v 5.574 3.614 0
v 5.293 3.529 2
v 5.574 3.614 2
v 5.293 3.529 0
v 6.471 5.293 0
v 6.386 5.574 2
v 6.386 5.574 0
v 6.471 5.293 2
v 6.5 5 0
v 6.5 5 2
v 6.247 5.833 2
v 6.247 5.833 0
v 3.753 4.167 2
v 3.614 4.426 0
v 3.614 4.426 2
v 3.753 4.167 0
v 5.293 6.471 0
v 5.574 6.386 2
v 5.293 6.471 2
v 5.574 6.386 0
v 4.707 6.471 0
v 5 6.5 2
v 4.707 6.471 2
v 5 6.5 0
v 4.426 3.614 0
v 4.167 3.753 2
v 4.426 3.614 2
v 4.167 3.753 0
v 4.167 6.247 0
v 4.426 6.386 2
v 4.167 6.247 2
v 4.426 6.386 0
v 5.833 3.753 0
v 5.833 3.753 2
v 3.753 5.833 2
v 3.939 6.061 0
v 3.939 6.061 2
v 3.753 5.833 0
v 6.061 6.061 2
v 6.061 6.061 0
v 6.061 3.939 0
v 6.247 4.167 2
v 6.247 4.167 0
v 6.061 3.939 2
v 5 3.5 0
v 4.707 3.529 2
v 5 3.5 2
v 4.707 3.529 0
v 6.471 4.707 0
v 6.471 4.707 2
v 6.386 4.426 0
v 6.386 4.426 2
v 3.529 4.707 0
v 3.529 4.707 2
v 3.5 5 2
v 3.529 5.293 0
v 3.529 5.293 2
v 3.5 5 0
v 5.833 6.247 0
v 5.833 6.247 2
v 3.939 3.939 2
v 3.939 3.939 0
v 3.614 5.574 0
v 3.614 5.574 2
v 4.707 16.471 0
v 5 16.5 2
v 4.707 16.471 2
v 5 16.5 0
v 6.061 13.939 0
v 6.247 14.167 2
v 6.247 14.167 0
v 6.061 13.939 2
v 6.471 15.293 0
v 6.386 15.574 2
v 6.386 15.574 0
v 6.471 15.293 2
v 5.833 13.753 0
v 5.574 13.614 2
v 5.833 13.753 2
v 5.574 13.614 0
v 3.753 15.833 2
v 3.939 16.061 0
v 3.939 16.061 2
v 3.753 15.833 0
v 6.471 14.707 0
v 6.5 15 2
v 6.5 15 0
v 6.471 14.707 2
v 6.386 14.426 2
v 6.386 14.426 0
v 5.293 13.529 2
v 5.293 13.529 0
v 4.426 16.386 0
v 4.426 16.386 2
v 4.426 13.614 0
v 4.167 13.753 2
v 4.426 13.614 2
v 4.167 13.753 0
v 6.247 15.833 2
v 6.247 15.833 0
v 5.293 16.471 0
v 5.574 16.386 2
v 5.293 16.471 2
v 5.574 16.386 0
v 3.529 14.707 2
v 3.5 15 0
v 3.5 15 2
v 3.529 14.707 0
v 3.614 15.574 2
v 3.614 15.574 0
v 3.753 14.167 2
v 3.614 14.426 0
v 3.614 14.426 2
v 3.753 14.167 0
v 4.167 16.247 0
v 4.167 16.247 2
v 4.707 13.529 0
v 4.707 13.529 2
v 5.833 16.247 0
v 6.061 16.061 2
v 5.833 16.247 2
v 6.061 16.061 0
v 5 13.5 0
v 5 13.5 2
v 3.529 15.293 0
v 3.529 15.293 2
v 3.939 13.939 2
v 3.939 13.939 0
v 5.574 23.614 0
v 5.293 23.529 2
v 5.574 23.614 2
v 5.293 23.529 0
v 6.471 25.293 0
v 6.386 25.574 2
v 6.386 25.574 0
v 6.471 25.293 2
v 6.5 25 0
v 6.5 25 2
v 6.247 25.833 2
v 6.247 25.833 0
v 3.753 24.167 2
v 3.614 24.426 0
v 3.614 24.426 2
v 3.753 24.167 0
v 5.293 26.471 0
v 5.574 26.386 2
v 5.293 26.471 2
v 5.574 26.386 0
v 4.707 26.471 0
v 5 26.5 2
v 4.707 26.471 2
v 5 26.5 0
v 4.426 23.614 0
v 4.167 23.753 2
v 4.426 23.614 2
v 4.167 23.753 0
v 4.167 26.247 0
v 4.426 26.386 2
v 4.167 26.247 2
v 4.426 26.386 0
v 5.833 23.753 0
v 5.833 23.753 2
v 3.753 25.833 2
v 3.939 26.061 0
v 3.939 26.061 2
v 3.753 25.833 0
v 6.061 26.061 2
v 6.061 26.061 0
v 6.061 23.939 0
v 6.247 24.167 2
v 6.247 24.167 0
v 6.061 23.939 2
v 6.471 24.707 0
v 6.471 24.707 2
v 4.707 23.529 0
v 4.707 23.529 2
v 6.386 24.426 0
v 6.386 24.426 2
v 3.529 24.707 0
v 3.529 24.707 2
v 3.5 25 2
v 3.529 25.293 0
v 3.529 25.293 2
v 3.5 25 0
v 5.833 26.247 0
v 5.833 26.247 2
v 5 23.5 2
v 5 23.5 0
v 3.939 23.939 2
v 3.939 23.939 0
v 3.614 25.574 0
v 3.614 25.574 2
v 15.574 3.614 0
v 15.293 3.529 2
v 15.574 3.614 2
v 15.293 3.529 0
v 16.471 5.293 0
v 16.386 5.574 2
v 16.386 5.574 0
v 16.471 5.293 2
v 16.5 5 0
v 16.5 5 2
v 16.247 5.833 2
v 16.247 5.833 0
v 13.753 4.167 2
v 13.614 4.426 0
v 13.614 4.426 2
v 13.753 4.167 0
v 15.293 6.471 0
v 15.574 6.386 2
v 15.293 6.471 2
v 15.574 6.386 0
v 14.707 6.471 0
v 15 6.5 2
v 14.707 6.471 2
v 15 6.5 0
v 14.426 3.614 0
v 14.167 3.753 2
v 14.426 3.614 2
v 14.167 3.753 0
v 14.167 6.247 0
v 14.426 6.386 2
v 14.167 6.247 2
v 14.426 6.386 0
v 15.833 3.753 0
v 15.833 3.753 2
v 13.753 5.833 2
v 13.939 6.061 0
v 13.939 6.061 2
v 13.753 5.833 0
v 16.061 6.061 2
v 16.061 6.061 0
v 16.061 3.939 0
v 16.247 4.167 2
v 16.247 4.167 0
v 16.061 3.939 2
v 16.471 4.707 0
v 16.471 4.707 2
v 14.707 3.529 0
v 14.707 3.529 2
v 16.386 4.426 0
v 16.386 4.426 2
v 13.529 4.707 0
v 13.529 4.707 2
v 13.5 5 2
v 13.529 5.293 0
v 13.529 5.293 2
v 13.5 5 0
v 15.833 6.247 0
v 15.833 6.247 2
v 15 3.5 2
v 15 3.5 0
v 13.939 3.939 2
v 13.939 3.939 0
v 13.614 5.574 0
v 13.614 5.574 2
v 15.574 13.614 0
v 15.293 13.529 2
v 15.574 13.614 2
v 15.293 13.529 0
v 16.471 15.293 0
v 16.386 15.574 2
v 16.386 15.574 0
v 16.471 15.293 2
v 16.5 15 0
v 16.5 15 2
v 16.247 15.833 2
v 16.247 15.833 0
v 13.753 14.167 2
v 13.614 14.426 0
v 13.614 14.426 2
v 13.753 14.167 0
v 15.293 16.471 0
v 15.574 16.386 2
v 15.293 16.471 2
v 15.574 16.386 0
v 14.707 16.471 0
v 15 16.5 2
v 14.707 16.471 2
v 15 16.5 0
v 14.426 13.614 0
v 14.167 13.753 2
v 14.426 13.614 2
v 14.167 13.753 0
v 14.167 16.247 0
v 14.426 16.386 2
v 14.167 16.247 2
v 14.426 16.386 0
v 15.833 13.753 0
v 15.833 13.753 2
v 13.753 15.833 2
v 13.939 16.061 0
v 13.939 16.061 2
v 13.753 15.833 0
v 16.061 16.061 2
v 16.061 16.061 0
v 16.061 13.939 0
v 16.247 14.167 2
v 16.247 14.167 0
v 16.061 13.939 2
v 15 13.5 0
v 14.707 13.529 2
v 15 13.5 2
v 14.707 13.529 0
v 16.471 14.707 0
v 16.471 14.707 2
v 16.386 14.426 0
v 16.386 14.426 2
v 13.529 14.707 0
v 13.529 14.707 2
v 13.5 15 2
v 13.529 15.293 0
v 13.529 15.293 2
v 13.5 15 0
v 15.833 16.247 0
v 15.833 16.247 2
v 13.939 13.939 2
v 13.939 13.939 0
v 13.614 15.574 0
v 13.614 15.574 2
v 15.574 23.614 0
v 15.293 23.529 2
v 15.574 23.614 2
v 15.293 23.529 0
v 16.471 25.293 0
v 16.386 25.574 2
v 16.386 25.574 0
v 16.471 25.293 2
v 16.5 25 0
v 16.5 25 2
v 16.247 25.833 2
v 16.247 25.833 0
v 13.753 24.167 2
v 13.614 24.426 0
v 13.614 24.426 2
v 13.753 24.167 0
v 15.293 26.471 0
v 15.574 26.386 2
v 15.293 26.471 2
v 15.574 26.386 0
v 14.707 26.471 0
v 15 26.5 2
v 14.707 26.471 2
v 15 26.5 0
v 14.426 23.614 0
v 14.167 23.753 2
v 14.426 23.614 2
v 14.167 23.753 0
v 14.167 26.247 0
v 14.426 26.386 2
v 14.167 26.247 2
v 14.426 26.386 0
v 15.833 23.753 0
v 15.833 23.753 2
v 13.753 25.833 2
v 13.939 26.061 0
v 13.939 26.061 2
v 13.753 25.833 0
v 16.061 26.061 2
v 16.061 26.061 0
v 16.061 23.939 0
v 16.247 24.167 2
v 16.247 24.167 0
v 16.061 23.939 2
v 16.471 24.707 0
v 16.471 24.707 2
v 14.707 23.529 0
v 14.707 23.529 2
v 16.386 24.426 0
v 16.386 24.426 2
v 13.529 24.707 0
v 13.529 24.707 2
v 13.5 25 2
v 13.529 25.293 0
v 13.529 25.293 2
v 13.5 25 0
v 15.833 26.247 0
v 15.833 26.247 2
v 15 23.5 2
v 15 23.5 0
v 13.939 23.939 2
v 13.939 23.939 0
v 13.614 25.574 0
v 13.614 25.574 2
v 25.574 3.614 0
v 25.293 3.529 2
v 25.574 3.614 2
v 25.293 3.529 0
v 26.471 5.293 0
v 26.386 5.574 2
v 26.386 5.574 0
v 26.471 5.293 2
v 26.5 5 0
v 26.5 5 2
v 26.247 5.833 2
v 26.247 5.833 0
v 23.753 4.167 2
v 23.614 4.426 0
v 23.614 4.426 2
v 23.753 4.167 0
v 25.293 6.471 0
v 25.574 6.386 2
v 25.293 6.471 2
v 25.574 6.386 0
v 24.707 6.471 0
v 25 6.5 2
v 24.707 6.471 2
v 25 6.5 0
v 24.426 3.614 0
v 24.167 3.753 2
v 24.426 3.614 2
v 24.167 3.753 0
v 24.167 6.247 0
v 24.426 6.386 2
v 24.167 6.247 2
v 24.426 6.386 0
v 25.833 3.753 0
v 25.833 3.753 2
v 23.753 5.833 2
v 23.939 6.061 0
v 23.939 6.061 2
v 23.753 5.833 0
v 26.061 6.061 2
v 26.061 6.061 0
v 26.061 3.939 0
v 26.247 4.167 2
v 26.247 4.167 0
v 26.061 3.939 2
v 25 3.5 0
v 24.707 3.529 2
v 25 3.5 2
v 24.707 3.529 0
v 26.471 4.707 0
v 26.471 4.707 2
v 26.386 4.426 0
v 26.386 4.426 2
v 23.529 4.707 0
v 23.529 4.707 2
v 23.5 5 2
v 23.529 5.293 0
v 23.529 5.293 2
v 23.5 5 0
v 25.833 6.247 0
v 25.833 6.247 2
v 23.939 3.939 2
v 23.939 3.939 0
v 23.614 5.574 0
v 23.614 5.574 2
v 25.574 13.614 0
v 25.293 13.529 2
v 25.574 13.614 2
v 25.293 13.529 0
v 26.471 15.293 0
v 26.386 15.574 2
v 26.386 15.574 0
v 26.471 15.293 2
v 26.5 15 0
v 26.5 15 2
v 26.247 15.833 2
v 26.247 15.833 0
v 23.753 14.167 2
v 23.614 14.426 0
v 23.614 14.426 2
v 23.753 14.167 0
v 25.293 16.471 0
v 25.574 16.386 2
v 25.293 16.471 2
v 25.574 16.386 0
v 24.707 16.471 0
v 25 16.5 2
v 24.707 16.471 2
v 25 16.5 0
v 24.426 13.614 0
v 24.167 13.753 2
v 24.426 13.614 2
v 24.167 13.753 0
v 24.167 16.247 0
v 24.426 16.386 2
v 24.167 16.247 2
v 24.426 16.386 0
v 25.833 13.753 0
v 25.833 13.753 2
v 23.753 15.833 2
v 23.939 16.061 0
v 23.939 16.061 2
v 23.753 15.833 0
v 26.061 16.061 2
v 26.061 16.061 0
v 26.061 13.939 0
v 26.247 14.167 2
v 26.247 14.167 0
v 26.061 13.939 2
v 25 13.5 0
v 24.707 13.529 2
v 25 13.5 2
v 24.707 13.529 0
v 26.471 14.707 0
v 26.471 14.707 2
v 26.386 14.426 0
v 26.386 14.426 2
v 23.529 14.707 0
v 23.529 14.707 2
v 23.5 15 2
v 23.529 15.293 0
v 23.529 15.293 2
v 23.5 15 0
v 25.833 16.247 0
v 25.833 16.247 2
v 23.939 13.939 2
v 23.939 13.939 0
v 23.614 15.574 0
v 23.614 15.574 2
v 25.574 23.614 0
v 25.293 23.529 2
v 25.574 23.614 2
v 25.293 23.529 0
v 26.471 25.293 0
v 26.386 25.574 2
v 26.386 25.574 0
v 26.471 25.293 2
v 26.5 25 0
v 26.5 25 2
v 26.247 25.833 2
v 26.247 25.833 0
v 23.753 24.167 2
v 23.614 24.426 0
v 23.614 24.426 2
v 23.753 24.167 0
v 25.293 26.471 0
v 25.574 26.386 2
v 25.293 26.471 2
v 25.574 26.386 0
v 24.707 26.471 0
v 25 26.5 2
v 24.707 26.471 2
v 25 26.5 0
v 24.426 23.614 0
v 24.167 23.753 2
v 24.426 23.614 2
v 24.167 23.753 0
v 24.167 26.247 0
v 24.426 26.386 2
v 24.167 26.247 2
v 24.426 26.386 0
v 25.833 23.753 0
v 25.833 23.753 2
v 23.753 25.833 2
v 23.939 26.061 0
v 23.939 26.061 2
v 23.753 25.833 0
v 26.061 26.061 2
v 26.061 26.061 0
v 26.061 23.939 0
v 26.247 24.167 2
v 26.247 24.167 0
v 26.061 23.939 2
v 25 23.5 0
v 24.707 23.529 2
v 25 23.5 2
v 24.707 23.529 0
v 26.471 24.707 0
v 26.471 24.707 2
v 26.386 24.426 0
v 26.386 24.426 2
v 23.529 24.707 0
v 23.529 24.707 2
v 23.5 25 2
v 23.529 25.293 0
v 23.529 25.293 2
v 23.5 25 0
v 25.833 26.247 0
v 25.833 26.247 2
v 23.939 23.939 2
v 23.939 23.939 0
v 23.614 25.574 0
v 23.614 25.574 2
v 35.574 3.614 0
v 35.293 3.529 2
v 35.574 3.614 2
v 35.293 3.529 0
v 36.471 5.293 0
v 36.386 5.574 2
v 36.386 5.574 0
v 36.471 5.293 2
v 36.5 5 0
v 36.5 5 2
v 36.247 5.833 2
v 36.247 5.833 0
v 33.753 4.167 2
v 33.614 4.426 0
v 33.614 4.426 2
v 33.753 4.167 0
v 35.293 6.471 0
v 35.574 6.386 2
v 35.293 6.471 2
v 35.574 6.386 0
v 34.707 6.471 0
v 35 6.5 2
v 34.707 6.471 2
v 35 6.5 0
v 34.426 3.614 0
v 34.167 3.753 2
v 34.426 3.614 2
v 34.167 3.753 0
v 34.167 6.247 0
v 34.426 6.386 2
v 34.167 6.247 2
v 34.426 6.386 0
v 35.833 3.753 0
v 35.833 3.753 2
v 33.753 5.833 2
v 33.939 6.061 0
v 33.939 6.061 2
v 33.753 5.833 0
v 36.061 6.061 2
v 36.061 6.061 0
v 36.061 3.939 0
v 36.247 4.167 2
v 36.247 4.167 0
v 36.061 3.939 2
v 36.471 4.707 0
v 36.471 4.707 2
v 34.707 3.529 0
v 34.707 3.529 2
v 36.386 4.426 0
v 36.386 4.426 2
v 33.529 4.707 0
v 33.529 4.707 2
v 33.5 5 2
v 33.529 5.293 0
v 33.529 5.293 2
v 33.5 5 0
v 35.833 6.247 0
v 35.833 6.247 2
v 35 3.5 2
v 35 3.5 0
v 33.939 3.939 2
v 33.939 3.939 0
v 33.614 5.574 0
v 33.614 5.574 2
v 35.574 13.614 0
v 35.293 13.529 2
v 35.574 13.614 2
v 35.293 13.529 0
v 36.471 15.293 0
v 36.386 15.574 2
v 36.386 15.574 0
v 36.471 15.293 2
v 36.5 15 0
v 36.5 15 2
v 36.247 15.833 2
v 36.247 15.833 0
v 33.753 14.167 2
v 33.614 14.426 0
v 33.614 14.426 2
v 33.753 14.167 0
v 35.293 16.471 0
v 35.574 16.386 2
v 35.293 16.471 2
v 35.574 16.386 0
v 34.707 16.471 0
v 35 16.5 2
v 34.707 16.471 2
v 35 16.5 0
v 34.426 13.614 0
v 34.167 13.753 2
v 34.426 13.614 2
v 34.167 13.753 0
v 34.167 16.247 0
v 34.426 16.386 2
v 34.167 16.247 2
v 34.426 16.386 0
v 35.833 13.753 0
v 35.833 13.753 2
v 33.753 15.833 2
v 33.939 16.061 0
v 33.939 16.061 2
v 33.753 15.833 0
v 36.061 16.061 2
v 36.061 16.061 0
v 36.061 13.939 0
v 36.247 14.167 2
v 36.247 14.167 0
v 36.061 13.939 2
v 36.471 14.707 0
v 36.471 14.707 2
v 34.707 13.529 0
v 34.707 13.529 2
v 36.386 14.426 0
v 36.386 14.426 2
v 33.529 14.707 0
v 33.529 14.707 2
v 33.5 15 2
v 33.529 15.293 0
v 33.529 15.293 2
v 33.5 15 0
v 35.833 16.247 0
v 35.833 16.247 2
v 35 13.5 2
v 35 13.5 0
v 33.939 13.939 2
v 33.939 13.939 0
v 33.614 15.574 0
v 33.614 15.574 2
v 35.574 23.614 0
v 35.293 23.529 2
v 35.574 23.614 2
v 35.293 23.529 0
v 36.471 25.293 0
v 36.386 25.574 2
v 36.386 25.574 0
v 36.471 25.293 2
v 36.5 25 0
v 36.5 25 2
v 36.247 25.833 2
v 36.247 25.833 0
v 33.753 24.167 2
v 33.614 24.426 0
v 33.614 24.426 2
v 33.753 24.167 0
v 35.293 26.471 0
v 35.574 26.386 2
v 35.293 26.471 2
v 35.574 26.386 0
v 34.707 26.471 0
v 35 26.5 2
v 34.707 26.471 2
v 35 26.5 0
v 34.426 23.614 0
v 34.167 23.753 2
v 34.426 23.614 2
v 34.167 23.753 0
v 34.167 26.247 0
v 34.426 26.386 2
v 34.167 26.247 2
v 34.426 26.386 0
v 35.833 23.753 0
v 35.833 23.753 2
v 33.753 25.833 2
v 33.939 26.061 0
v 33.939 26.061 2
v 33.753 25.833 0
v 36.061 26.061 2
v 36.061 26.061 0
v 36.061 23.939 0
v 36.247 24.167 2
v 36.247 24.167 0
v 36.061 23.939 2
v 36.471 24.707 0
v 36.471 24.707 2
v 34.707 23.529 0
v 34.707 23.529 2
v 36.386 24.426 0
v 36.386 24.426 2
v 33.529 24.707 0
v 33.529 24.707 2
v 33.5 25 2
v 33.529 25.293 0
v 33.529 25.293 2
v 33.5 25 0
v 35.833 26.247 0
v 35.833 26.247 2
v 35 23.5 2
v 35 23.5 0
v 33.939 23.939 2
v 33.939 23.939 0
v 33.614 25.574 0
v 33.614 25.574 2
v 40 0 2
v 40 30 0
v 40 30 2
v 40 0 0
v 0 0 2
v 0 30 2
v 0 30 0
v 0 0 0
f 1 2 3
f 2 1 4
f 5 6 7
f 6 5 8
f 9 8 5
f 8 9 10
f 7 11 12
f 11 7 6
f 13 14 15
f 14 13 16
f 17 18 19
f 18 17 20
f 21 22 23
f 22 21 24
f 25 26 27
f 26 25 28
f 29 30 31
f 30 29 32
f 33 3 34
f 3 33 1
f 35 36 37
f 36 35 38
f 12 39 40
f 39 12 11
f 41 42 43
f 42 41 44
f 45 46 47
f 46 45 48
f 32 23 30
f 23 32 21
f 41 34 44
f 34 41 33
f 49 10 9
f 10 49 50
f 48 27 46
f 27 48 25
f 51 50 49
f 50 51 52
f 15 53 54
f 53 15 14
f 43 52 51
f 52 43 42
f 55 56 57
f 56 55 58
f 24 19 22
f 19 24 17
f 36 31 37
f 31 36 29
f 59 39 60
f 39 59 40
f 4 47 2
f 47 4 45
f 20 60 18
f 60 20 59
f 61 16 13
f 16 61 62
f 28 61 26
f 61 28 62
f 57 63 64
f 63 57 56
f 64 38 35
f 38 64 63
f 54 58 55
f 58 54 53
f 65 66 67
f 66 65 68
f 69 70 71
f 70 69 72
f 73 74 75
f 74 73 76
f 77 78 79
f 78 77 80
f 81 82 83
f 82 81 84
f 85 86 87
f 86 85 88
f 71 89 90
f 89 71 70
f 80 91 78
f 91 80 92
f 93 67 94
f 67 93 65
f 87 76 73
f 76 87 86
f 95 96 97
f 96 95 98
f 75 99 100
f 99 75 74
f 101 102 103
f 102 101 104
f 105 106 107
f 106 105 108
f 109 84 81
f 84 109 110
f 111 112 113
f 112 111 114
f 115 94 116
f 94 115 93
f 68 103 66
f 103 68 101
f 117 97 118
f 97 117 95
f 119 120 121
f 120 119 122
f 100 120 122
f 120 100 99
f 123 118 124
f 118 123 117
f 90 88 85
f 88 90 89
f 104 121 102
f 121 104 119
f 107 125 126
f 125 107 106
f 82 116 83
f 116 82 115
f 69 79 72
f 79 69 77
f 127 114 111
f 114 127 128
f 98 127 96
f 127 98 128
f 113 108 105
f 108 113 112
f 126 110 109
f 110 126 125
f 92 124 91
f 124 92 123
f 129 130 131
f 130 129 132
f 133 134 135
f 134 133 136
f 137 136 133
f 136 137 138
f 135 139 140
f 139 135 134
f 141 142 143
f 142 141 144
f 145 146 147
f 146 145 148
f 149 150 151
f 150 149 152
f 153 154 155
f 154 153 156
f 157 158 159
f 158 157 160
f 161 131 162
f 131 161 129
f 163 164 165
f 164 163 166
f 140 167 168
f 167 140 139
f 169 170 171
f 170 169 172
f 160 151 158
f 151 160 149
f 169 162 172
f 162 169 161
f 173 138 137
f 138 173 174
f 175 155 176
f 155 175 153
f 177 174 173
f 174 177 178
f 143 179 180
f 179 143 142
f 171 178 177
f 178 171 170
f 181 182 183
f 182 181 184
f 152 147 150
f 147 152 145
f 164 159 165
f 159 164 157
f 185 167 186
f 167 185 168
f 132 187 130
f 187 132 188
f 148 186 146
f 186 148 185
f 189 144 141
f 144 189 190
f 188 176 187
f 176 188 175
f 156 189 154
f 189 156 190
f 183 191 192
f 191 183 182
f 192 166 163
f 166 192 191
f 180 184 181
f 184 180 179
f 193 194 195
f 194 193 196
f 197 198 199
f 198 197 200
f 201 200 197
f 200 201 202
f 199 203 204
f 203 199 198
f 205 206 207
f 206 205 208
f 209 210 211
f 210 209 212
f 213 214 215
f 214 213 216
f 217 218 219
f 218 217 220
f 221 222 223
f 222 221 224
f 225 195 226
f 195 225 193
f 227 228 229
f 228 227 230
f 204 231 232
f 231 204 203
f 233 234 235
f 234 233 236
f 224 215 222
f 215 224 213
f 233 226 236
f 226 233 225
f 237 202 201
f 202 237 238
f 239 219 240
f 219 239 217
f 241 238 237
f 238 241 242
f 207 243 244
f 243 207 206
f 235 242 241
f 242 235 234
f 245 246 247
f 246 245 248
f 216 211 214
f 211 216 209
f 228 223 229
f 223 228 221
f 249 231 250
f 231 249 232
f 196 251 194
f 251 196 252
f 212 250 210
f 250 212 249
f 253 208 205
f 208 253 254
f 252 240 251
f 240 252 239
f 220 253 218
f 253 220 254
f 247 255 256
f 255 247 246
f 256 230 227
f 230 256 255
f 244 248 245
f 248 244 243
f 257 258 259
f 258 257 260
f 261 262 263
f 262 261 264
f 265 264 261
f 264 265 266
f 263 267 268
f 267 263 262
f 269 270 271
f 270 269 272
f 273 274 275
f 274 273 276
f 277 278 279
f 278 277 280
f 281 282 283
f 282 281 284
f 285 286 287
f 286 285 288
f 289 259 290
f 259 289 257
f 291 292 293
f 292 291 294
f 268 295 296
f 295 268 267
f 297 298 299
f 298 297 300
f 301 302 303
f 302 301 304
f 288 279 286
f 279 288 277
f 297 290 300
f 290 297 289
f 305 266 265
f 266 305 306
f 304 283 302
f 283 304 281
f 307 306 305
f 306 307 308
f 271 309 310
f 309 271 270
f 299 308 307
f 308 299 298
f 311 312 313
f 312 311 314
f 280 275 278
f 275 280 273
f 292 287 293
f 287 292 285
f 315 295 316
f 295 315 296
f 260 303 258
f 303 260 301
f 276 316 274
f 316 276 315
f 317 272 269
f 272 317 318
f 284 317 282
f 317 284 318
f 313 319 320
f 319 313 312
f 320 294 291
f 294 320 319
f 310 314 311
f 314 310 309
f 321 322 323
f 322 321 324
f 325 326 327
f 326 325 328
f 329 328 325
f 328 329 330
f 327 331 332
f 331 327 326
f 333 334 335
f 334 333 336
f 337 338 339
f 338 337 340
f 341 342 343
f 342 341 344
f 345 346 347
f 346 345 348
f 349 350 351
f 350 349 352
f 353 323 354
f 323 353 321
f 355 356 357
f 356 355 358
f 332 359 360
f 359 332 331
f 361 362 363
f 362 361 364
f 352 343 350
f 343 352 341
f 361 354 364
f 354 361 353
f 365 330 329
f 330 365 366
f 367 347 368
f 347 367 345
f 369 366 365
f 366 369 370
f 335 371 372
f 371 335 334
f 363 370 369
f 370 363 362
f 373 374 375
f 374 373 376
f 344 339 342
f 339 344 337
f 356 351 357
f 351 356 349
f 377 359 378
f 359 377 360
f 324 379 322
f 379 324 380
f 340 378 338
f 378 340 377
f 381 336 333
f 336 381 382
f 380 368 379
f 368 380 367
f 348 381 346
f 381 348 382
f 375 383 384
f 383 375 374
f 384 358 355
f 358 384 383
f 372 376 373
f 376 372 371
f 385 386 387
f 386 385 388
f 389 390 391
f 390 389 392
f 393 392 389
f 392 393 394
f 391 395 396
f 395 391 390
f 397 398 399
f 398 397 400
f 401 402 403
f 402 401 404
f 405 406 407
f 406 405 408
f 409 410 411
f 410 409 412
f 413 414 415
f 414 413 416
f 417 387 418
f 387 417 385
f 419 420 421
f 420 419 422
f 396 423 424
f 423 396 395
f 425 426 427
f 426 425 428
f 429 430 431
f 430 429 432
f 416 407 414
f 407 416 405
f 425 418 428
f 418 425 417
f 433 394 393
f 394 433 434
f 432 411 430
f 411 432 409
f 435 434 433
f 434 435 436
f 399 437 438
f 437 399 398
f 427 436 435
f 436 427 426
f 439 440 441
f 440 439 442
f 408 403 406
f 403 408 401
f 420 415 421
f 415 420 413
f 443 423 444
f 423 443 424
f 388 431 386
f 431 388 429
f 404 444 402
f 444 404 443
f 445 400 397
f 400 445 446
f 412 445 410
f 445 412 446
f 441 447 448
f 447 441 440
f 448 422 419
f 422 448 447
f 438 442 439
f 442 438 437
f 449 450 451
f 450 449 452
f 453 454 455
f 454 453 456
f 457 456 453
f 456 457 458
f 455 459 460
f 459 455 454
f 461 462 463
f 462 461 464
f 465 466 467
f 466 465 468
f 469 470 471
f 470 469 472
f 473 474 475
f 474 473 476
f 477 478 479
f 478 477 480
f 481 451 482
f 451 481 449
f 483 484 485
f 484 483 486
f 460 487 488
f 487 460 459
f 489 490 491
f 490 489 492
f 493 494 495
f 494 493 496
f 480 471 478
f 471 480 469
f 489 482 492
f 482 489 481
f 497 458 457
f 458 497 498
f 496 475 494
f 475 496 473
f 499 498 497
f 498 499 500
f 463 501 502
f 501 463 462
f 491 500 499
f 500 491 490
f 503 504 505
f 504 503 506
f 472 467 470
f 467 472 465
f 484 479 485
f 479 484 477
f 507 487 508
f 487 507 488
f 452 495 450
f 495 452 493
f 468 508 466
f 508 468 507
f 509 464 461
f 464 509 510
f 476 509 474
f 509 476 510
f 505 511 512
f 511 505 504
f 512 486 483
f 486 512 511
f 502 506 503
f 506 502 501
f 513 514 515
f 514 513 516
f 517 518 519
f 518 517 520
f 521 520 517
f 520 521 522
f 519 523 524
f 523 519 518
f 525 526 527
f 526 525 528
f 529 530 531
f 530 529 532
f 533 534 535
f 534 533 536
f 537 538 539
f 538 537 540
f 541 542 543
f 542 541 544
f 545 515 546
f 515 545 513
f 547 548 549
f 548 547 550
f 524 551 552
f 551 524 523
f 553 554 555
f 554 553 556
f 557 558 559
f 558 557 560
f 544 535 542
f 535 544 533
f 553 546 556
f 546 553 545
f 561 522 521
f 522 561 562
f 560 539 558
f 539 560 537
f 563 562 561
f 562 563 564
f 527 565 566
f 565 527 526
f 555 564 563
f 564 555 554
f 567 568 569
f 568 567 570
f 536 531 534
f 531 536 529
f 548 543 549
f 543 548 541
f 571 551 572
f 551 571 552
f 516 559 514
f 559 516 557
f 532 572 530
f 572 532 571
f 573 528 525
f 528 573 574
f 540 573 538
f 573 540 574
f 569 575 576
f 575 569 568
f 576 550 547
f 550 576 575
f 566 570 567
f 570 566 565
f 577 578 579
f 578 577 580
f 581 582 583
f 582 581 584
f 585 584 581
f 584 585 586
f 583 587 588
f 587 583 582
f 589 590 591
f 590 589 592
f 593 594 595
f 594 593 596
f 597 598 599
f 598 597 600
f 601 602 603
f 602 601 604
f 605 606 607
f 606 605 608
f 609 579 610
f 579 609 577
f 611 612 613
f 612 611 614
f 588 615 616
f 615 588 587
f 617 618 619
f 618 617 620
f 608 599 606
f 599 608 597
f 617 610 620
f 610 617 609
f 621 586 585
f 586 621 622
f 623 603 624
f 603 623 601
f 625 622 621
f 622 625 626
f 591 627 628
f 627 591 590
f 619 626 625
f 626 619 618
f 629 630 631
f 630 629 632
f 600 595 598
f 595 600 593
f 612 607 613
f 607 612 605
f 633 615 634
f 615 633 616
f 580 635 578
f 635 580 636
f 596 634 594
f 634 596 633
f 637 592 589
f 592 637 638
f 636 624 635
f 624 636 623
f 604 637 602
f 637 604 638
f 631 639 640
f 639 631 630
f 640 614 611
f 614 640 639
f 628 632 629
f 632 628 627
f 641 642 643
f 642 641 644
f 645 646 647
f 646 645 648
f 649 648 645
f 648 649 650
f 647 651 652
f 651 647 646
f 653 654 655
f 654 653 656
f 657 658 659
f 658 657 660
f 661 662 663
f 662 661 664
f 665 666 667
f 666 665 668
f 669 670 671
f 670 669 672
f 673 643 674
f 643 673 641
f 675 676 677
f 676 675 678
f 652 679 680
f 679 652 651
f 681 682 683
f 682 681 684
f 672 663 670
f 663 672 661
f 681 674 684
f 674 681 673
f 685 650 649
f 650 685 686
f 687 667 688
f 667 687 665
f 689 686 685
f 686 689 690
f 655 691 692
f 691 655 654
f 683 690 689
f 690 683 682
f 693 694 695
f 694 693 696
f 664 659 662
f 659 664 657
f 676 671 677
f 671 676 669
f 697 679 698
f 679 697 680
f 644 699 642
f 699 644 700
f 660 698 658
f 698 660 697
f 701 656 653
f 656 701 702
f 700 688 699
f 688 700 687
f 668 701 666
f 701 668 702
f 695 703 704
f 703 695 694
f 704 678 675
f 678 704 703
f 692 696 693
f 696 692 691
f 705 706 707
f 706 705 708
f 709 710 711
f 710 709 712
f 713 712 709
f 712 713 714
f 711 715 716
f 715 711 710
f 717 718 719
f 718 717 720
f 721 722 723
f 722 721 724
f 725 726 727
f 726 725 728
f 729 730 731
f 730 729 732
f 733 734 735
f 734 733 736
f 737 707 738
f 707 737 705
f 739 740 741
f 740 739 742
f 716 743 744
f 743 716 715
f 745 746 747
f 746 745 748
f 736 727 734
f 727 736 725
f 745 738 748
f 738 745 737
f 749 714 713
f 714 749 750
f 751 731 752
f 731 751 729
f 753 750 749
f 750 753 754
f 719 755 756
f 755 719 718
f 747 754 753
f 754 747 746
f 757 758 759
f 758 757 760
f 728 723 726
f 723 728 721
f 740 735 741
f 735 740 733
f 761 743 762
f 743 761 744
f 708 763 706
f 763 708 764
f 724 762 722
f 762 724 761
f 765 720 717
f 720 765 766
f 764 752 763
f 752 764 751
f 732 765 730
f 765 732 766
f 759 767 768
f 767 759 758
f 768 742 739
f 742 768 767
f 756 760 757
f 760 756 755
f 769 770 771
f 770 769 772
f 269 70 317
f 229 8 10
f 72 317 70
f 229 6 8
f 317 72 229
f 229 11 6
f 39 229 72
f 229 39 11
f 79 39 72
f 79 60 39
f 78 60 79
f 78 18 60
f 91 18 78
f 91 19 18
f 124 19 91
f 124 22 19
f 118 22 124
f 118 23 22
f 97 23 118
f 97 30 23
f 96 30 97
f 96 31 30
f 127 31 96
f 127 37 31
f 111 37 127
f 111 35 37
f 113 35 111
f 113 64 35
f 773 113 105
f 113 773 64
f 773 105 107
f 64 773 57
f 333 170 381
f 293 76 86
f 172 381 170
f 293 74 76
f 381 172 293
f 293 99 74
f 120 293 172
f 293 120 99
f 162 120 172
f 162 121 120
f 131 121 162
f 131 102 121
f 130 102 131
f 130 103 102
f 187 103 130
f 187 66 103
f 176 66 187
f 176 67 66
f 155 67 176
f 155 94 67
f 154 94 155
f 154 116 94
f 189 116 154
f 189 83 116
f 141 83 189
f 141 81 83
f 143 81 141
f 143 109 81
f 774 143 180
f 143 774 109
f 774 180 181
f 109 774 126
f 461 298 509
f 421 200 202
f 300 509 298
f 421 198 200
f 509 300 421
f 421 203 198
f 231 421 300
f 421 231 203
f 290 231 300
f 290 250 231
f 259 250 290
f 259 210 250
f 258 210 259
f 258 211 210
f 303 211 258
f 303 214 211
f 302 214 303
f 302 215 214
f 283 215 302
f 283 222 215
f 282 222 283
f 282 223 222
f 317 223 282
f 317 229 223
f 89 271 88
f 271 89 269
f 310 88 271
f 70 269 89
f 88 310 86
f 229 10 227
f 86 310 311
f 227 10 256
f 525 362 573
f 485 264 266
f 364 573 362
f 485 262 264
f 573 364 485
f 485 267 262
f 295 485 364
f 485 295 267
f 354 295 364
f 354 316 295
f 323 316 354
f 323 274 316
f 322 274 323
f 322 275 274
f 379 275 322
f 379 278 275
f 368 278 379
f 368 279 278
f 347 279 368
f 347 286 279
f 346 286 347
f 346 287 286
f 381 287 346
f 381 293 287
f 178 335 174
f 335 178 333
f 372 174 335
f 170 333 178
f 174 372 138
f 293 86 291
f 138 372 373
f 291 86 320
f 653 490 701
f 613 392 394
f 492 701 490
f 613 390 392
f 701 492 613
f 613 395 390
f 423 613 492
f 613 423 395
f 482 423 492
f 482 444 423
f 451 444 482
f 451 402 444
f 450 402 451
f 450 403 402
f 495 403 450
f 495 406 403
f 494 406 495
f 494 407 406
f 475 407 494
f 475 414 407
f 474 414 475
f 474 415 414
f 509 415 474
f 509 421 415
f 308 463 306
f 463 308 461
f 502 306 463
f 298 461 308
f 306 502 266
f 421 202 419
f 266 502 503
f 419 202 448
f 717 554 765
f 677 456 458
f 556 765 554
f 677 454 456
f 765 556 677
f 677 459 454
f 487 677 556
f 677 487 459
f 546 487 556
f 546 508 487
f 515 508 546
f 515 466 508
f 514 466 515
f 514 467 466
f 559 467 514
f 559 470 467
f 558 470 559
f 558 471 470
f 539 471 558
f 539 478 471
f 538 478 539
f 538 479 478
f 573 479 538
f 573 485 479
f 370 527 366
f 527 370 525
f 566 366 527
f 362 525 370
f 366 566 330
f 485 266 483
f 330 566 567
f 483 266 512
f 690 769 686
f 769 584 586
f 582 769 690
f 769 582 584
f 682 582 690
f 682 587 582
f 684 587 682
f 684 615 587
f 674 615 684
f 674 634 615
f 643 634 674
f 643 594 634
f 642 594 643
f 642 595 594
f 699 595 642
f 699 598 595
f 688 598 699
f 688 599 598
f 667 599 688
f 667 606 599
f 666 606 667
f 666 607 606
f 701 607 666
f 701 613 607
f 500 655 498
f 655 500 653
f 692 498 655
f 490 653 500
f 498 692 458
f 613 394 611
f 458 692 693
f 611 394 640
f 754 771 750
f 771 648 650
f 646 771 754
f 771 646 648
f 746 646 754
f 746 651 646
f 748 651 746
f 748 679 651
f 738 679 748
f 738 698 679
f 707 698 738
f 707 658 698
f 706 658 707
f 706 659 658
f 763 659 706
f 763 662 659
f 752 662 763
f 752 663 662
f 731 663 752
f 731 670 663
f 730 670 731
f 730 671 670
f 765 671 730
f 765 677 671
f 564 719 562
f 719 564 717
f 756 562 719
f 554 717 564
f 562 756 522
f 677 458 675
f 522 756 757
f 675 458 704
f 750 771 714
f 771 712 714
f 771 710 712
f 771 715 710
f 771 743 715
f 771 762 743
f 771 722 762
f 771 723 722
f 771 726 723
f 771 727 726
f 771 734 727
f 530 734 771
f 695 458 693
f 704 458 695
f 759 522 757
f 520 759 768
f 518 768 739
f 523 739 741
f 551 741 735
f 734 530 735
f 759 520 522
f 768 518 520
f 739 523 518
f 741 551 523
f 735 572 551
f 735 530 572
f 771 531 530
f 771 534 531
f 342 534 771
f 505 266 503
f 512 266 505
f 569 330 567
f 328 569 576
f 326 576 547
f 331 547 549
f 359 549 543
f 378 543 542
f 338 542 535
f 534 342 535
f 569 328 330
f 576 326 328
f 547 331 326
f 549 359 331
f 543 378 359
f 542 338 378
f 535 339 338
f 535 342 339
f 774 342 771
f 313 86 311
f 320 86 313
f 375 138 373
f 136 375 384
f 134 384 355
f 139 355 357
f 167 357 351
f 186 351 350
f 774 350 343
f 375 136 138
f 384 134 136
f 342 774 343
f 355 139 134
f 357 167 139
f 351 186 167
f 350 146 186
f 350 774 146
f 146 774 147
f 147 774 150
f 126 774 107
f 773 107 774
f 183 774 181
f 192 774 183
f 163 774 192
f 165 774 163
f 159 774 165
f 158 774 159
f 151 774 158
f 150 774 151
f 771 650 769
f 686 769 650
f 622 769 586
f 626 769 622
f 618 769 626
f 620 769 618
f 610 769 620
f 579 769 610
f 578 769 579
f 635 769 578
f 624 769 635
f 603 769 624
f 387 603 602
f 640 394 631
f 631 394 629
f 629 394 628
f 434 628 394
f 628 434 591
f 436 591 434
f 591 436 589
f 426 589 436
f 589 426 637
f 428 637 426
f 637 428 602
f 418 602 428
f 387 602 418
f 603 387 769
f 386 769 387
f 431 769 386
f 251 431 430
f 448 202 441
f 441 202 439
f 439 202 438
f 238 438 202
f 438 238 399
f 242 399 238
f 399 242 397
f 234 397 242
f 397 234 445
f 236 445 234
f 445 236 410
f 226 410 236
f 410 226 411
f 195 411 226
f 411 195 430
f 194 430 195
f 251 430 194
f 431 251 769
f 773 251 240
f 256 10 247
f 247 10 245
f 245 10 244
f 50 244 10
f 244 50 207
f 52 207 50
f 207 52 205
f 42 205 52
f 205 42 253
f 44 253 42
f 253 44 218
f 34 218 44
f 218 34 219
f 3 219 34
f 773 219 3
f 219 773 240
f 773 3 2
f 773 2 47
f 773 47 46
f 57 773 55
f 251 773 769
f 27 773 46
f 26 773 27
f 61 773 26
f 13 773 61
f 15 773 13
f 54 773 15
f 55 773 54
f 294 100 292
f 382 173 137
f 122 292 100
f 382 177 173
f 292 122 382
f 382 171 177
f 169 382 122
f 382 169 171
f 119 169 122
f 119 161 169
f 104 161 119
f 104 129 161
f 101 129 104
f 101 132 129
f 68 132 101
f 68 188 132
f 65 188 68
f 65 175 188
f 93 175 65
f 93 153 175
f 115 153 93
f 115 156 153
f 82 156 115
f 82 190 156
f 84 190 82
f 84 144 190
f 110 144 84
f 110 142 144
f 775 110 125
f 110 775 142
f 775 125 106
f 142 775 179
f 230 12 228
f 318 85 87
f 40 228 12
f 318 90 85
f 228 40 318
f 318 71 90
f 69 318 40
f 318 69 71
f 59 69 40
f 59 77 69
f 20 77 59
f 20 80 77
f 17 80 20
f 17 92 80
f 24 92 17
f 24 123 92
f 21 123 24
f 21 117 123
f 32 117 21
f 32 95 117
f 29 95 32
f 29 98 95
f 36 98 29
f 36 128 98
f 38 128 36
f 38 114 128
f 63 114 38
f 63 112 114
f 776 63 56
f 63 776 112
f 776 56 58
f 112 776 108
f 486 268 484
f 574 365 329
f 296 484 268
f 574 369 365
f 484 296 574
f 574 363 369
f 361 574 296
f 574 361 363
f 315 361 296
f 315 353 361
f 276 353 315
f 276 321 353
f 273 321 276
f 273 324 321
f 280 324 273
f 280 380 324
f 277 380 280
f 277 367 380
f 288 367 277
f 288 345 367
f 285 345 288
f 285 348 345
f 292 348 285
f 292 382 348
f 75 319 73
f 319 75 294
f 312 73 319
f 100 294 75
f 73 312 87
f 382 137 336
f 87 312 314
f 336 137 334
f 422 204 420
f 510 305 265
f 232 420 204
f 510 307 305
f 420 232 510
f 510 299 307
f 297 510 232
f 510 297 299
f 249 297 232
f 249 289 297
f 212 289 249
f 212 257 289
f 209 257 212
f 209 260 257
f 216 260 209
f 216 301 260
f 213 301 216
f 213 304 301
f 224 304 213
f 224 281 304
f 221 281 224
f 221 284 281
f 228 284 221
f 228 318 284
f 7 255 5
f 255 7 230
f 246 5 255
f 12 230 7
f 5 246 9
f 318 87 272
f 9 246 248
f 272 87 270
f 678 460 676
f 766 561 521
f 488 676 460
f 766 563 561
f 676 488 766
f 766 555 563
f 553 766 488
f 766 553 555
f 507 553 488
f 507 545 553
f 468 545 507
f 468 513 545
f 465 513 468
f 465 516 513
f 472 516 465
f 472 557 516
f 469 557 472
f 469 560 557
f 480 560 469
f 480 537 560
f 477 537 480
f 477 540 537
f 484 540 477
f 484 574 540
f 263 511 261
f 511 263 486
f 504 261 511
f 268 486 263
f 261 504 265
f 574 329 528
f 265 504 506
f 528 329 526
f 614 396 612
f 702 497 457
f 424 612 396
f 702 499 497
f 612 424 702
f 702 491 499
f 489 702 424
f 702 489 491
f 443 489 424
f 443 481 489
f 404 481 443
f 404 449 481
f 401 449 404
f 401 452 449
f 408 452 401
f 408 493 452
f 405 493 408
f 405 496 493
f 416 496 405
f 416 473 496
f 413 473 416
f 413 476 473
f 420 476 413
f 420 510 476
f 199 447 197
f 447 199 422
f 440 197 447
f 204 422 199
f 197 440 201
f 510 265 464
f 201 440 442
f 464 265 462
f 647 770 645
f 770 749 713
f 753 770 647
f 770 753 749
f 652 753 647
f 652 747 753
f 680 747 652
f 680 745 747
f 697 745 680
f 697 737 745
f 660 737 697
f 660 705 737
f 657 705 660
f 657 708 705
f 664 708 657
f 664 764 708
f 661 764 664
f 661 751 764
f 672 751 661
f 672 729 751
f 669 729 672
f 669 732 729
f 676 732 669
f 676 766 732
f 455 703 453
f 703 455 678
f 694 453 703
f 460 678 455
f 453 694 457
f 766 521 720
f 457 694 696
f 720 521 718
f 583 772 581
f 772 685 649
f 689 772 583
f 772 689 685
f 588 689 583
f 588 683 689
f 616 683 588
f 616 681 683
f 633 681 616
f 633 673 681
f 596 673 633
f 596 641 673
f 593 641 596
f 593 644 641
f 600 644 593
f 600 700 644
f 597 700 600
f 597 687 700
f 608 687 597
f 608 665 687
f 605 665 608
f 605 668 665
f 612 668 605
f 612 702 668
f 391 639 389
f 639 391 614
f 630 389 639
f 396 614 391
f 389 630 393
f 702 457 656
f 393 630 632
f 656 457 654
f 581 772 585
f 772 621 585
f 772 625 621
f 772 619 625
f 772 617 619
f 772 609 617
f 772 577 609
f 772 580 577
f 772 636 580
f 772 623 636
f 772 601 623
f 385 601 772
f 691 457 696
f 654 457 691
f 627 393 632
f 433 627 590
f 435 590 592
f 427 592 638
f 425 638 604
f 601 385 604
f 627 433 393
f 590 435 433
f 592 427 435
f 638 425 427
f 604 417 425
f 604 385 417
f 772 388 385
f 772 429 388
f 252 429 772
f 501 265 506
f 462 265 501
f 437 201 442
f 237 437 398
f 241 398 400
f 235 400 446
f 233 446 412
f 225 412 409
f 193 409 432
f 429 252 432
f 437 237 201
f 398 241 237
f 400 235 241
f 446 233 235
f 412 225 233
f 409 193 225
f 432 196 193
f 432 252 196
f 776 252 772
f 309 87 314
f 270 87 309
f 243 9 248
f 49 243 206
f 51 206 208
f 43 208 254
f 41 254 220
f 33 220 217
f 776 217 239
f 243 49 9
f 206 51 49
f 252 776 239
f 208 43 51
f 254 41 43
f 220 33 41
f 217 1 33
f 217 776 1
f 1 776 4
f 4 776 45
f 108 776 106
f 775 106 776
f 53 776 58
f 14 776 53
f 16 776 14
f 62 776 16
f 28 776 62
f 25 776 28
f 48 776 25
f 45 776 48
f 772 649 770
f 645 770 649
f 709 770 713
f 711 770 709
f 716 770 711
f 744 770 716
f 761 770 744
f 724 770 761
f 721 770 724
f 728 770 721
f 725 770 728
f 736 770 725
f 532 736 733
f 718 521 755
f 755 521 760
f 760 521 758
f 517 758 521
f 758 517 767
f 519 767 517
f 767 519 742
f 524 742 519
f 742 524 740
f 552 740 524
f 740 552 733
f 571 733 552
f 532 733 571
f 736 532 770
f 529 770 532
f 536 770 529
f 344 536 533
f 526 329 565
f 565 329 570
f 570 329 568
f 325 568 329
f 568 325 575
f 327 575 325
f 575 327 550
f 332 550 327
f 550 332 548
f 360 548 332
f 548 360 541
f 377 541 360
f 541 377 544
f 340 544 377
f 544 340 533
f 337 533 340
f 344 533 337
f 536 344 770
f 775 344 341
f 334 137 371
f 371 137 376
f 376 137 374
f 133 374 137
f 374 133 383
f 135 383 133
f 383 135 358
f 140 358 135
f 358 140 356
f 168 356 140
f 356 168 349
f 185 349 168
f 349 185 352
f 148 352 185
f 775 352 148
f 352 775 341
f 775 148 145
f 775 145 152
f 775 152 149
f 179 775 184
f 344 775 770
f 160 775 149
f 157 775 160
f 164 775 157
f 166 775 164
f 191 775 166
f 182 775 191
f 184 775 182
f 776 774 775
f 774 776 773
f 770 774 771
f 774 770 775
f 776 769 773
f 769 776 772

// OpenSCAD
// Perforated plate — a simple parametric grid plate with an optional hole per cell.
// SPDX-License-Identifier: MIT
// Copyright (c) 2026 Tinkerex. FIRST-PARTY: written for this repo, not vendored from anywhere,
// so it carries no third-party licensing question at all.
//
// Its job is to keep the catalog endpoints (/generators, /source/<key>) genuinely exercised
// before Task 6 vendors the audited third-party generators alongside it. It is also shaped to
// exercise the Customizer's real surface: every parameter below is a top-level LITERAL assignment
// declared before the first `{` in the file, which is exactly where OpenSCAD stops collecting.

/* [Plate] */
// number of columns
cols = 4; // [1:20]
// number of rows
rows = 3; // [1:20]
// cell pitch in mm
pitch = 10;
// plate thickness in mm
thickness = 2;

/* [Holes] */
// drill a hole through each cell
holes = true;
// hole diameter in mm
hole_dia = 3;

module plate() {
    difference() {
        cube([cols * pitch, rows * pitch, thickness]);
        if (holes)
            for (i = [0 : cols - 1], j = [0 : rows - 1])
                translate([(i + 0.5) * pitch, (j + 0.5) * pitch, -1])
                    cylinder(h = thickness + 2, d = hole_dia, $fn = 32);
    }
}

plate();
